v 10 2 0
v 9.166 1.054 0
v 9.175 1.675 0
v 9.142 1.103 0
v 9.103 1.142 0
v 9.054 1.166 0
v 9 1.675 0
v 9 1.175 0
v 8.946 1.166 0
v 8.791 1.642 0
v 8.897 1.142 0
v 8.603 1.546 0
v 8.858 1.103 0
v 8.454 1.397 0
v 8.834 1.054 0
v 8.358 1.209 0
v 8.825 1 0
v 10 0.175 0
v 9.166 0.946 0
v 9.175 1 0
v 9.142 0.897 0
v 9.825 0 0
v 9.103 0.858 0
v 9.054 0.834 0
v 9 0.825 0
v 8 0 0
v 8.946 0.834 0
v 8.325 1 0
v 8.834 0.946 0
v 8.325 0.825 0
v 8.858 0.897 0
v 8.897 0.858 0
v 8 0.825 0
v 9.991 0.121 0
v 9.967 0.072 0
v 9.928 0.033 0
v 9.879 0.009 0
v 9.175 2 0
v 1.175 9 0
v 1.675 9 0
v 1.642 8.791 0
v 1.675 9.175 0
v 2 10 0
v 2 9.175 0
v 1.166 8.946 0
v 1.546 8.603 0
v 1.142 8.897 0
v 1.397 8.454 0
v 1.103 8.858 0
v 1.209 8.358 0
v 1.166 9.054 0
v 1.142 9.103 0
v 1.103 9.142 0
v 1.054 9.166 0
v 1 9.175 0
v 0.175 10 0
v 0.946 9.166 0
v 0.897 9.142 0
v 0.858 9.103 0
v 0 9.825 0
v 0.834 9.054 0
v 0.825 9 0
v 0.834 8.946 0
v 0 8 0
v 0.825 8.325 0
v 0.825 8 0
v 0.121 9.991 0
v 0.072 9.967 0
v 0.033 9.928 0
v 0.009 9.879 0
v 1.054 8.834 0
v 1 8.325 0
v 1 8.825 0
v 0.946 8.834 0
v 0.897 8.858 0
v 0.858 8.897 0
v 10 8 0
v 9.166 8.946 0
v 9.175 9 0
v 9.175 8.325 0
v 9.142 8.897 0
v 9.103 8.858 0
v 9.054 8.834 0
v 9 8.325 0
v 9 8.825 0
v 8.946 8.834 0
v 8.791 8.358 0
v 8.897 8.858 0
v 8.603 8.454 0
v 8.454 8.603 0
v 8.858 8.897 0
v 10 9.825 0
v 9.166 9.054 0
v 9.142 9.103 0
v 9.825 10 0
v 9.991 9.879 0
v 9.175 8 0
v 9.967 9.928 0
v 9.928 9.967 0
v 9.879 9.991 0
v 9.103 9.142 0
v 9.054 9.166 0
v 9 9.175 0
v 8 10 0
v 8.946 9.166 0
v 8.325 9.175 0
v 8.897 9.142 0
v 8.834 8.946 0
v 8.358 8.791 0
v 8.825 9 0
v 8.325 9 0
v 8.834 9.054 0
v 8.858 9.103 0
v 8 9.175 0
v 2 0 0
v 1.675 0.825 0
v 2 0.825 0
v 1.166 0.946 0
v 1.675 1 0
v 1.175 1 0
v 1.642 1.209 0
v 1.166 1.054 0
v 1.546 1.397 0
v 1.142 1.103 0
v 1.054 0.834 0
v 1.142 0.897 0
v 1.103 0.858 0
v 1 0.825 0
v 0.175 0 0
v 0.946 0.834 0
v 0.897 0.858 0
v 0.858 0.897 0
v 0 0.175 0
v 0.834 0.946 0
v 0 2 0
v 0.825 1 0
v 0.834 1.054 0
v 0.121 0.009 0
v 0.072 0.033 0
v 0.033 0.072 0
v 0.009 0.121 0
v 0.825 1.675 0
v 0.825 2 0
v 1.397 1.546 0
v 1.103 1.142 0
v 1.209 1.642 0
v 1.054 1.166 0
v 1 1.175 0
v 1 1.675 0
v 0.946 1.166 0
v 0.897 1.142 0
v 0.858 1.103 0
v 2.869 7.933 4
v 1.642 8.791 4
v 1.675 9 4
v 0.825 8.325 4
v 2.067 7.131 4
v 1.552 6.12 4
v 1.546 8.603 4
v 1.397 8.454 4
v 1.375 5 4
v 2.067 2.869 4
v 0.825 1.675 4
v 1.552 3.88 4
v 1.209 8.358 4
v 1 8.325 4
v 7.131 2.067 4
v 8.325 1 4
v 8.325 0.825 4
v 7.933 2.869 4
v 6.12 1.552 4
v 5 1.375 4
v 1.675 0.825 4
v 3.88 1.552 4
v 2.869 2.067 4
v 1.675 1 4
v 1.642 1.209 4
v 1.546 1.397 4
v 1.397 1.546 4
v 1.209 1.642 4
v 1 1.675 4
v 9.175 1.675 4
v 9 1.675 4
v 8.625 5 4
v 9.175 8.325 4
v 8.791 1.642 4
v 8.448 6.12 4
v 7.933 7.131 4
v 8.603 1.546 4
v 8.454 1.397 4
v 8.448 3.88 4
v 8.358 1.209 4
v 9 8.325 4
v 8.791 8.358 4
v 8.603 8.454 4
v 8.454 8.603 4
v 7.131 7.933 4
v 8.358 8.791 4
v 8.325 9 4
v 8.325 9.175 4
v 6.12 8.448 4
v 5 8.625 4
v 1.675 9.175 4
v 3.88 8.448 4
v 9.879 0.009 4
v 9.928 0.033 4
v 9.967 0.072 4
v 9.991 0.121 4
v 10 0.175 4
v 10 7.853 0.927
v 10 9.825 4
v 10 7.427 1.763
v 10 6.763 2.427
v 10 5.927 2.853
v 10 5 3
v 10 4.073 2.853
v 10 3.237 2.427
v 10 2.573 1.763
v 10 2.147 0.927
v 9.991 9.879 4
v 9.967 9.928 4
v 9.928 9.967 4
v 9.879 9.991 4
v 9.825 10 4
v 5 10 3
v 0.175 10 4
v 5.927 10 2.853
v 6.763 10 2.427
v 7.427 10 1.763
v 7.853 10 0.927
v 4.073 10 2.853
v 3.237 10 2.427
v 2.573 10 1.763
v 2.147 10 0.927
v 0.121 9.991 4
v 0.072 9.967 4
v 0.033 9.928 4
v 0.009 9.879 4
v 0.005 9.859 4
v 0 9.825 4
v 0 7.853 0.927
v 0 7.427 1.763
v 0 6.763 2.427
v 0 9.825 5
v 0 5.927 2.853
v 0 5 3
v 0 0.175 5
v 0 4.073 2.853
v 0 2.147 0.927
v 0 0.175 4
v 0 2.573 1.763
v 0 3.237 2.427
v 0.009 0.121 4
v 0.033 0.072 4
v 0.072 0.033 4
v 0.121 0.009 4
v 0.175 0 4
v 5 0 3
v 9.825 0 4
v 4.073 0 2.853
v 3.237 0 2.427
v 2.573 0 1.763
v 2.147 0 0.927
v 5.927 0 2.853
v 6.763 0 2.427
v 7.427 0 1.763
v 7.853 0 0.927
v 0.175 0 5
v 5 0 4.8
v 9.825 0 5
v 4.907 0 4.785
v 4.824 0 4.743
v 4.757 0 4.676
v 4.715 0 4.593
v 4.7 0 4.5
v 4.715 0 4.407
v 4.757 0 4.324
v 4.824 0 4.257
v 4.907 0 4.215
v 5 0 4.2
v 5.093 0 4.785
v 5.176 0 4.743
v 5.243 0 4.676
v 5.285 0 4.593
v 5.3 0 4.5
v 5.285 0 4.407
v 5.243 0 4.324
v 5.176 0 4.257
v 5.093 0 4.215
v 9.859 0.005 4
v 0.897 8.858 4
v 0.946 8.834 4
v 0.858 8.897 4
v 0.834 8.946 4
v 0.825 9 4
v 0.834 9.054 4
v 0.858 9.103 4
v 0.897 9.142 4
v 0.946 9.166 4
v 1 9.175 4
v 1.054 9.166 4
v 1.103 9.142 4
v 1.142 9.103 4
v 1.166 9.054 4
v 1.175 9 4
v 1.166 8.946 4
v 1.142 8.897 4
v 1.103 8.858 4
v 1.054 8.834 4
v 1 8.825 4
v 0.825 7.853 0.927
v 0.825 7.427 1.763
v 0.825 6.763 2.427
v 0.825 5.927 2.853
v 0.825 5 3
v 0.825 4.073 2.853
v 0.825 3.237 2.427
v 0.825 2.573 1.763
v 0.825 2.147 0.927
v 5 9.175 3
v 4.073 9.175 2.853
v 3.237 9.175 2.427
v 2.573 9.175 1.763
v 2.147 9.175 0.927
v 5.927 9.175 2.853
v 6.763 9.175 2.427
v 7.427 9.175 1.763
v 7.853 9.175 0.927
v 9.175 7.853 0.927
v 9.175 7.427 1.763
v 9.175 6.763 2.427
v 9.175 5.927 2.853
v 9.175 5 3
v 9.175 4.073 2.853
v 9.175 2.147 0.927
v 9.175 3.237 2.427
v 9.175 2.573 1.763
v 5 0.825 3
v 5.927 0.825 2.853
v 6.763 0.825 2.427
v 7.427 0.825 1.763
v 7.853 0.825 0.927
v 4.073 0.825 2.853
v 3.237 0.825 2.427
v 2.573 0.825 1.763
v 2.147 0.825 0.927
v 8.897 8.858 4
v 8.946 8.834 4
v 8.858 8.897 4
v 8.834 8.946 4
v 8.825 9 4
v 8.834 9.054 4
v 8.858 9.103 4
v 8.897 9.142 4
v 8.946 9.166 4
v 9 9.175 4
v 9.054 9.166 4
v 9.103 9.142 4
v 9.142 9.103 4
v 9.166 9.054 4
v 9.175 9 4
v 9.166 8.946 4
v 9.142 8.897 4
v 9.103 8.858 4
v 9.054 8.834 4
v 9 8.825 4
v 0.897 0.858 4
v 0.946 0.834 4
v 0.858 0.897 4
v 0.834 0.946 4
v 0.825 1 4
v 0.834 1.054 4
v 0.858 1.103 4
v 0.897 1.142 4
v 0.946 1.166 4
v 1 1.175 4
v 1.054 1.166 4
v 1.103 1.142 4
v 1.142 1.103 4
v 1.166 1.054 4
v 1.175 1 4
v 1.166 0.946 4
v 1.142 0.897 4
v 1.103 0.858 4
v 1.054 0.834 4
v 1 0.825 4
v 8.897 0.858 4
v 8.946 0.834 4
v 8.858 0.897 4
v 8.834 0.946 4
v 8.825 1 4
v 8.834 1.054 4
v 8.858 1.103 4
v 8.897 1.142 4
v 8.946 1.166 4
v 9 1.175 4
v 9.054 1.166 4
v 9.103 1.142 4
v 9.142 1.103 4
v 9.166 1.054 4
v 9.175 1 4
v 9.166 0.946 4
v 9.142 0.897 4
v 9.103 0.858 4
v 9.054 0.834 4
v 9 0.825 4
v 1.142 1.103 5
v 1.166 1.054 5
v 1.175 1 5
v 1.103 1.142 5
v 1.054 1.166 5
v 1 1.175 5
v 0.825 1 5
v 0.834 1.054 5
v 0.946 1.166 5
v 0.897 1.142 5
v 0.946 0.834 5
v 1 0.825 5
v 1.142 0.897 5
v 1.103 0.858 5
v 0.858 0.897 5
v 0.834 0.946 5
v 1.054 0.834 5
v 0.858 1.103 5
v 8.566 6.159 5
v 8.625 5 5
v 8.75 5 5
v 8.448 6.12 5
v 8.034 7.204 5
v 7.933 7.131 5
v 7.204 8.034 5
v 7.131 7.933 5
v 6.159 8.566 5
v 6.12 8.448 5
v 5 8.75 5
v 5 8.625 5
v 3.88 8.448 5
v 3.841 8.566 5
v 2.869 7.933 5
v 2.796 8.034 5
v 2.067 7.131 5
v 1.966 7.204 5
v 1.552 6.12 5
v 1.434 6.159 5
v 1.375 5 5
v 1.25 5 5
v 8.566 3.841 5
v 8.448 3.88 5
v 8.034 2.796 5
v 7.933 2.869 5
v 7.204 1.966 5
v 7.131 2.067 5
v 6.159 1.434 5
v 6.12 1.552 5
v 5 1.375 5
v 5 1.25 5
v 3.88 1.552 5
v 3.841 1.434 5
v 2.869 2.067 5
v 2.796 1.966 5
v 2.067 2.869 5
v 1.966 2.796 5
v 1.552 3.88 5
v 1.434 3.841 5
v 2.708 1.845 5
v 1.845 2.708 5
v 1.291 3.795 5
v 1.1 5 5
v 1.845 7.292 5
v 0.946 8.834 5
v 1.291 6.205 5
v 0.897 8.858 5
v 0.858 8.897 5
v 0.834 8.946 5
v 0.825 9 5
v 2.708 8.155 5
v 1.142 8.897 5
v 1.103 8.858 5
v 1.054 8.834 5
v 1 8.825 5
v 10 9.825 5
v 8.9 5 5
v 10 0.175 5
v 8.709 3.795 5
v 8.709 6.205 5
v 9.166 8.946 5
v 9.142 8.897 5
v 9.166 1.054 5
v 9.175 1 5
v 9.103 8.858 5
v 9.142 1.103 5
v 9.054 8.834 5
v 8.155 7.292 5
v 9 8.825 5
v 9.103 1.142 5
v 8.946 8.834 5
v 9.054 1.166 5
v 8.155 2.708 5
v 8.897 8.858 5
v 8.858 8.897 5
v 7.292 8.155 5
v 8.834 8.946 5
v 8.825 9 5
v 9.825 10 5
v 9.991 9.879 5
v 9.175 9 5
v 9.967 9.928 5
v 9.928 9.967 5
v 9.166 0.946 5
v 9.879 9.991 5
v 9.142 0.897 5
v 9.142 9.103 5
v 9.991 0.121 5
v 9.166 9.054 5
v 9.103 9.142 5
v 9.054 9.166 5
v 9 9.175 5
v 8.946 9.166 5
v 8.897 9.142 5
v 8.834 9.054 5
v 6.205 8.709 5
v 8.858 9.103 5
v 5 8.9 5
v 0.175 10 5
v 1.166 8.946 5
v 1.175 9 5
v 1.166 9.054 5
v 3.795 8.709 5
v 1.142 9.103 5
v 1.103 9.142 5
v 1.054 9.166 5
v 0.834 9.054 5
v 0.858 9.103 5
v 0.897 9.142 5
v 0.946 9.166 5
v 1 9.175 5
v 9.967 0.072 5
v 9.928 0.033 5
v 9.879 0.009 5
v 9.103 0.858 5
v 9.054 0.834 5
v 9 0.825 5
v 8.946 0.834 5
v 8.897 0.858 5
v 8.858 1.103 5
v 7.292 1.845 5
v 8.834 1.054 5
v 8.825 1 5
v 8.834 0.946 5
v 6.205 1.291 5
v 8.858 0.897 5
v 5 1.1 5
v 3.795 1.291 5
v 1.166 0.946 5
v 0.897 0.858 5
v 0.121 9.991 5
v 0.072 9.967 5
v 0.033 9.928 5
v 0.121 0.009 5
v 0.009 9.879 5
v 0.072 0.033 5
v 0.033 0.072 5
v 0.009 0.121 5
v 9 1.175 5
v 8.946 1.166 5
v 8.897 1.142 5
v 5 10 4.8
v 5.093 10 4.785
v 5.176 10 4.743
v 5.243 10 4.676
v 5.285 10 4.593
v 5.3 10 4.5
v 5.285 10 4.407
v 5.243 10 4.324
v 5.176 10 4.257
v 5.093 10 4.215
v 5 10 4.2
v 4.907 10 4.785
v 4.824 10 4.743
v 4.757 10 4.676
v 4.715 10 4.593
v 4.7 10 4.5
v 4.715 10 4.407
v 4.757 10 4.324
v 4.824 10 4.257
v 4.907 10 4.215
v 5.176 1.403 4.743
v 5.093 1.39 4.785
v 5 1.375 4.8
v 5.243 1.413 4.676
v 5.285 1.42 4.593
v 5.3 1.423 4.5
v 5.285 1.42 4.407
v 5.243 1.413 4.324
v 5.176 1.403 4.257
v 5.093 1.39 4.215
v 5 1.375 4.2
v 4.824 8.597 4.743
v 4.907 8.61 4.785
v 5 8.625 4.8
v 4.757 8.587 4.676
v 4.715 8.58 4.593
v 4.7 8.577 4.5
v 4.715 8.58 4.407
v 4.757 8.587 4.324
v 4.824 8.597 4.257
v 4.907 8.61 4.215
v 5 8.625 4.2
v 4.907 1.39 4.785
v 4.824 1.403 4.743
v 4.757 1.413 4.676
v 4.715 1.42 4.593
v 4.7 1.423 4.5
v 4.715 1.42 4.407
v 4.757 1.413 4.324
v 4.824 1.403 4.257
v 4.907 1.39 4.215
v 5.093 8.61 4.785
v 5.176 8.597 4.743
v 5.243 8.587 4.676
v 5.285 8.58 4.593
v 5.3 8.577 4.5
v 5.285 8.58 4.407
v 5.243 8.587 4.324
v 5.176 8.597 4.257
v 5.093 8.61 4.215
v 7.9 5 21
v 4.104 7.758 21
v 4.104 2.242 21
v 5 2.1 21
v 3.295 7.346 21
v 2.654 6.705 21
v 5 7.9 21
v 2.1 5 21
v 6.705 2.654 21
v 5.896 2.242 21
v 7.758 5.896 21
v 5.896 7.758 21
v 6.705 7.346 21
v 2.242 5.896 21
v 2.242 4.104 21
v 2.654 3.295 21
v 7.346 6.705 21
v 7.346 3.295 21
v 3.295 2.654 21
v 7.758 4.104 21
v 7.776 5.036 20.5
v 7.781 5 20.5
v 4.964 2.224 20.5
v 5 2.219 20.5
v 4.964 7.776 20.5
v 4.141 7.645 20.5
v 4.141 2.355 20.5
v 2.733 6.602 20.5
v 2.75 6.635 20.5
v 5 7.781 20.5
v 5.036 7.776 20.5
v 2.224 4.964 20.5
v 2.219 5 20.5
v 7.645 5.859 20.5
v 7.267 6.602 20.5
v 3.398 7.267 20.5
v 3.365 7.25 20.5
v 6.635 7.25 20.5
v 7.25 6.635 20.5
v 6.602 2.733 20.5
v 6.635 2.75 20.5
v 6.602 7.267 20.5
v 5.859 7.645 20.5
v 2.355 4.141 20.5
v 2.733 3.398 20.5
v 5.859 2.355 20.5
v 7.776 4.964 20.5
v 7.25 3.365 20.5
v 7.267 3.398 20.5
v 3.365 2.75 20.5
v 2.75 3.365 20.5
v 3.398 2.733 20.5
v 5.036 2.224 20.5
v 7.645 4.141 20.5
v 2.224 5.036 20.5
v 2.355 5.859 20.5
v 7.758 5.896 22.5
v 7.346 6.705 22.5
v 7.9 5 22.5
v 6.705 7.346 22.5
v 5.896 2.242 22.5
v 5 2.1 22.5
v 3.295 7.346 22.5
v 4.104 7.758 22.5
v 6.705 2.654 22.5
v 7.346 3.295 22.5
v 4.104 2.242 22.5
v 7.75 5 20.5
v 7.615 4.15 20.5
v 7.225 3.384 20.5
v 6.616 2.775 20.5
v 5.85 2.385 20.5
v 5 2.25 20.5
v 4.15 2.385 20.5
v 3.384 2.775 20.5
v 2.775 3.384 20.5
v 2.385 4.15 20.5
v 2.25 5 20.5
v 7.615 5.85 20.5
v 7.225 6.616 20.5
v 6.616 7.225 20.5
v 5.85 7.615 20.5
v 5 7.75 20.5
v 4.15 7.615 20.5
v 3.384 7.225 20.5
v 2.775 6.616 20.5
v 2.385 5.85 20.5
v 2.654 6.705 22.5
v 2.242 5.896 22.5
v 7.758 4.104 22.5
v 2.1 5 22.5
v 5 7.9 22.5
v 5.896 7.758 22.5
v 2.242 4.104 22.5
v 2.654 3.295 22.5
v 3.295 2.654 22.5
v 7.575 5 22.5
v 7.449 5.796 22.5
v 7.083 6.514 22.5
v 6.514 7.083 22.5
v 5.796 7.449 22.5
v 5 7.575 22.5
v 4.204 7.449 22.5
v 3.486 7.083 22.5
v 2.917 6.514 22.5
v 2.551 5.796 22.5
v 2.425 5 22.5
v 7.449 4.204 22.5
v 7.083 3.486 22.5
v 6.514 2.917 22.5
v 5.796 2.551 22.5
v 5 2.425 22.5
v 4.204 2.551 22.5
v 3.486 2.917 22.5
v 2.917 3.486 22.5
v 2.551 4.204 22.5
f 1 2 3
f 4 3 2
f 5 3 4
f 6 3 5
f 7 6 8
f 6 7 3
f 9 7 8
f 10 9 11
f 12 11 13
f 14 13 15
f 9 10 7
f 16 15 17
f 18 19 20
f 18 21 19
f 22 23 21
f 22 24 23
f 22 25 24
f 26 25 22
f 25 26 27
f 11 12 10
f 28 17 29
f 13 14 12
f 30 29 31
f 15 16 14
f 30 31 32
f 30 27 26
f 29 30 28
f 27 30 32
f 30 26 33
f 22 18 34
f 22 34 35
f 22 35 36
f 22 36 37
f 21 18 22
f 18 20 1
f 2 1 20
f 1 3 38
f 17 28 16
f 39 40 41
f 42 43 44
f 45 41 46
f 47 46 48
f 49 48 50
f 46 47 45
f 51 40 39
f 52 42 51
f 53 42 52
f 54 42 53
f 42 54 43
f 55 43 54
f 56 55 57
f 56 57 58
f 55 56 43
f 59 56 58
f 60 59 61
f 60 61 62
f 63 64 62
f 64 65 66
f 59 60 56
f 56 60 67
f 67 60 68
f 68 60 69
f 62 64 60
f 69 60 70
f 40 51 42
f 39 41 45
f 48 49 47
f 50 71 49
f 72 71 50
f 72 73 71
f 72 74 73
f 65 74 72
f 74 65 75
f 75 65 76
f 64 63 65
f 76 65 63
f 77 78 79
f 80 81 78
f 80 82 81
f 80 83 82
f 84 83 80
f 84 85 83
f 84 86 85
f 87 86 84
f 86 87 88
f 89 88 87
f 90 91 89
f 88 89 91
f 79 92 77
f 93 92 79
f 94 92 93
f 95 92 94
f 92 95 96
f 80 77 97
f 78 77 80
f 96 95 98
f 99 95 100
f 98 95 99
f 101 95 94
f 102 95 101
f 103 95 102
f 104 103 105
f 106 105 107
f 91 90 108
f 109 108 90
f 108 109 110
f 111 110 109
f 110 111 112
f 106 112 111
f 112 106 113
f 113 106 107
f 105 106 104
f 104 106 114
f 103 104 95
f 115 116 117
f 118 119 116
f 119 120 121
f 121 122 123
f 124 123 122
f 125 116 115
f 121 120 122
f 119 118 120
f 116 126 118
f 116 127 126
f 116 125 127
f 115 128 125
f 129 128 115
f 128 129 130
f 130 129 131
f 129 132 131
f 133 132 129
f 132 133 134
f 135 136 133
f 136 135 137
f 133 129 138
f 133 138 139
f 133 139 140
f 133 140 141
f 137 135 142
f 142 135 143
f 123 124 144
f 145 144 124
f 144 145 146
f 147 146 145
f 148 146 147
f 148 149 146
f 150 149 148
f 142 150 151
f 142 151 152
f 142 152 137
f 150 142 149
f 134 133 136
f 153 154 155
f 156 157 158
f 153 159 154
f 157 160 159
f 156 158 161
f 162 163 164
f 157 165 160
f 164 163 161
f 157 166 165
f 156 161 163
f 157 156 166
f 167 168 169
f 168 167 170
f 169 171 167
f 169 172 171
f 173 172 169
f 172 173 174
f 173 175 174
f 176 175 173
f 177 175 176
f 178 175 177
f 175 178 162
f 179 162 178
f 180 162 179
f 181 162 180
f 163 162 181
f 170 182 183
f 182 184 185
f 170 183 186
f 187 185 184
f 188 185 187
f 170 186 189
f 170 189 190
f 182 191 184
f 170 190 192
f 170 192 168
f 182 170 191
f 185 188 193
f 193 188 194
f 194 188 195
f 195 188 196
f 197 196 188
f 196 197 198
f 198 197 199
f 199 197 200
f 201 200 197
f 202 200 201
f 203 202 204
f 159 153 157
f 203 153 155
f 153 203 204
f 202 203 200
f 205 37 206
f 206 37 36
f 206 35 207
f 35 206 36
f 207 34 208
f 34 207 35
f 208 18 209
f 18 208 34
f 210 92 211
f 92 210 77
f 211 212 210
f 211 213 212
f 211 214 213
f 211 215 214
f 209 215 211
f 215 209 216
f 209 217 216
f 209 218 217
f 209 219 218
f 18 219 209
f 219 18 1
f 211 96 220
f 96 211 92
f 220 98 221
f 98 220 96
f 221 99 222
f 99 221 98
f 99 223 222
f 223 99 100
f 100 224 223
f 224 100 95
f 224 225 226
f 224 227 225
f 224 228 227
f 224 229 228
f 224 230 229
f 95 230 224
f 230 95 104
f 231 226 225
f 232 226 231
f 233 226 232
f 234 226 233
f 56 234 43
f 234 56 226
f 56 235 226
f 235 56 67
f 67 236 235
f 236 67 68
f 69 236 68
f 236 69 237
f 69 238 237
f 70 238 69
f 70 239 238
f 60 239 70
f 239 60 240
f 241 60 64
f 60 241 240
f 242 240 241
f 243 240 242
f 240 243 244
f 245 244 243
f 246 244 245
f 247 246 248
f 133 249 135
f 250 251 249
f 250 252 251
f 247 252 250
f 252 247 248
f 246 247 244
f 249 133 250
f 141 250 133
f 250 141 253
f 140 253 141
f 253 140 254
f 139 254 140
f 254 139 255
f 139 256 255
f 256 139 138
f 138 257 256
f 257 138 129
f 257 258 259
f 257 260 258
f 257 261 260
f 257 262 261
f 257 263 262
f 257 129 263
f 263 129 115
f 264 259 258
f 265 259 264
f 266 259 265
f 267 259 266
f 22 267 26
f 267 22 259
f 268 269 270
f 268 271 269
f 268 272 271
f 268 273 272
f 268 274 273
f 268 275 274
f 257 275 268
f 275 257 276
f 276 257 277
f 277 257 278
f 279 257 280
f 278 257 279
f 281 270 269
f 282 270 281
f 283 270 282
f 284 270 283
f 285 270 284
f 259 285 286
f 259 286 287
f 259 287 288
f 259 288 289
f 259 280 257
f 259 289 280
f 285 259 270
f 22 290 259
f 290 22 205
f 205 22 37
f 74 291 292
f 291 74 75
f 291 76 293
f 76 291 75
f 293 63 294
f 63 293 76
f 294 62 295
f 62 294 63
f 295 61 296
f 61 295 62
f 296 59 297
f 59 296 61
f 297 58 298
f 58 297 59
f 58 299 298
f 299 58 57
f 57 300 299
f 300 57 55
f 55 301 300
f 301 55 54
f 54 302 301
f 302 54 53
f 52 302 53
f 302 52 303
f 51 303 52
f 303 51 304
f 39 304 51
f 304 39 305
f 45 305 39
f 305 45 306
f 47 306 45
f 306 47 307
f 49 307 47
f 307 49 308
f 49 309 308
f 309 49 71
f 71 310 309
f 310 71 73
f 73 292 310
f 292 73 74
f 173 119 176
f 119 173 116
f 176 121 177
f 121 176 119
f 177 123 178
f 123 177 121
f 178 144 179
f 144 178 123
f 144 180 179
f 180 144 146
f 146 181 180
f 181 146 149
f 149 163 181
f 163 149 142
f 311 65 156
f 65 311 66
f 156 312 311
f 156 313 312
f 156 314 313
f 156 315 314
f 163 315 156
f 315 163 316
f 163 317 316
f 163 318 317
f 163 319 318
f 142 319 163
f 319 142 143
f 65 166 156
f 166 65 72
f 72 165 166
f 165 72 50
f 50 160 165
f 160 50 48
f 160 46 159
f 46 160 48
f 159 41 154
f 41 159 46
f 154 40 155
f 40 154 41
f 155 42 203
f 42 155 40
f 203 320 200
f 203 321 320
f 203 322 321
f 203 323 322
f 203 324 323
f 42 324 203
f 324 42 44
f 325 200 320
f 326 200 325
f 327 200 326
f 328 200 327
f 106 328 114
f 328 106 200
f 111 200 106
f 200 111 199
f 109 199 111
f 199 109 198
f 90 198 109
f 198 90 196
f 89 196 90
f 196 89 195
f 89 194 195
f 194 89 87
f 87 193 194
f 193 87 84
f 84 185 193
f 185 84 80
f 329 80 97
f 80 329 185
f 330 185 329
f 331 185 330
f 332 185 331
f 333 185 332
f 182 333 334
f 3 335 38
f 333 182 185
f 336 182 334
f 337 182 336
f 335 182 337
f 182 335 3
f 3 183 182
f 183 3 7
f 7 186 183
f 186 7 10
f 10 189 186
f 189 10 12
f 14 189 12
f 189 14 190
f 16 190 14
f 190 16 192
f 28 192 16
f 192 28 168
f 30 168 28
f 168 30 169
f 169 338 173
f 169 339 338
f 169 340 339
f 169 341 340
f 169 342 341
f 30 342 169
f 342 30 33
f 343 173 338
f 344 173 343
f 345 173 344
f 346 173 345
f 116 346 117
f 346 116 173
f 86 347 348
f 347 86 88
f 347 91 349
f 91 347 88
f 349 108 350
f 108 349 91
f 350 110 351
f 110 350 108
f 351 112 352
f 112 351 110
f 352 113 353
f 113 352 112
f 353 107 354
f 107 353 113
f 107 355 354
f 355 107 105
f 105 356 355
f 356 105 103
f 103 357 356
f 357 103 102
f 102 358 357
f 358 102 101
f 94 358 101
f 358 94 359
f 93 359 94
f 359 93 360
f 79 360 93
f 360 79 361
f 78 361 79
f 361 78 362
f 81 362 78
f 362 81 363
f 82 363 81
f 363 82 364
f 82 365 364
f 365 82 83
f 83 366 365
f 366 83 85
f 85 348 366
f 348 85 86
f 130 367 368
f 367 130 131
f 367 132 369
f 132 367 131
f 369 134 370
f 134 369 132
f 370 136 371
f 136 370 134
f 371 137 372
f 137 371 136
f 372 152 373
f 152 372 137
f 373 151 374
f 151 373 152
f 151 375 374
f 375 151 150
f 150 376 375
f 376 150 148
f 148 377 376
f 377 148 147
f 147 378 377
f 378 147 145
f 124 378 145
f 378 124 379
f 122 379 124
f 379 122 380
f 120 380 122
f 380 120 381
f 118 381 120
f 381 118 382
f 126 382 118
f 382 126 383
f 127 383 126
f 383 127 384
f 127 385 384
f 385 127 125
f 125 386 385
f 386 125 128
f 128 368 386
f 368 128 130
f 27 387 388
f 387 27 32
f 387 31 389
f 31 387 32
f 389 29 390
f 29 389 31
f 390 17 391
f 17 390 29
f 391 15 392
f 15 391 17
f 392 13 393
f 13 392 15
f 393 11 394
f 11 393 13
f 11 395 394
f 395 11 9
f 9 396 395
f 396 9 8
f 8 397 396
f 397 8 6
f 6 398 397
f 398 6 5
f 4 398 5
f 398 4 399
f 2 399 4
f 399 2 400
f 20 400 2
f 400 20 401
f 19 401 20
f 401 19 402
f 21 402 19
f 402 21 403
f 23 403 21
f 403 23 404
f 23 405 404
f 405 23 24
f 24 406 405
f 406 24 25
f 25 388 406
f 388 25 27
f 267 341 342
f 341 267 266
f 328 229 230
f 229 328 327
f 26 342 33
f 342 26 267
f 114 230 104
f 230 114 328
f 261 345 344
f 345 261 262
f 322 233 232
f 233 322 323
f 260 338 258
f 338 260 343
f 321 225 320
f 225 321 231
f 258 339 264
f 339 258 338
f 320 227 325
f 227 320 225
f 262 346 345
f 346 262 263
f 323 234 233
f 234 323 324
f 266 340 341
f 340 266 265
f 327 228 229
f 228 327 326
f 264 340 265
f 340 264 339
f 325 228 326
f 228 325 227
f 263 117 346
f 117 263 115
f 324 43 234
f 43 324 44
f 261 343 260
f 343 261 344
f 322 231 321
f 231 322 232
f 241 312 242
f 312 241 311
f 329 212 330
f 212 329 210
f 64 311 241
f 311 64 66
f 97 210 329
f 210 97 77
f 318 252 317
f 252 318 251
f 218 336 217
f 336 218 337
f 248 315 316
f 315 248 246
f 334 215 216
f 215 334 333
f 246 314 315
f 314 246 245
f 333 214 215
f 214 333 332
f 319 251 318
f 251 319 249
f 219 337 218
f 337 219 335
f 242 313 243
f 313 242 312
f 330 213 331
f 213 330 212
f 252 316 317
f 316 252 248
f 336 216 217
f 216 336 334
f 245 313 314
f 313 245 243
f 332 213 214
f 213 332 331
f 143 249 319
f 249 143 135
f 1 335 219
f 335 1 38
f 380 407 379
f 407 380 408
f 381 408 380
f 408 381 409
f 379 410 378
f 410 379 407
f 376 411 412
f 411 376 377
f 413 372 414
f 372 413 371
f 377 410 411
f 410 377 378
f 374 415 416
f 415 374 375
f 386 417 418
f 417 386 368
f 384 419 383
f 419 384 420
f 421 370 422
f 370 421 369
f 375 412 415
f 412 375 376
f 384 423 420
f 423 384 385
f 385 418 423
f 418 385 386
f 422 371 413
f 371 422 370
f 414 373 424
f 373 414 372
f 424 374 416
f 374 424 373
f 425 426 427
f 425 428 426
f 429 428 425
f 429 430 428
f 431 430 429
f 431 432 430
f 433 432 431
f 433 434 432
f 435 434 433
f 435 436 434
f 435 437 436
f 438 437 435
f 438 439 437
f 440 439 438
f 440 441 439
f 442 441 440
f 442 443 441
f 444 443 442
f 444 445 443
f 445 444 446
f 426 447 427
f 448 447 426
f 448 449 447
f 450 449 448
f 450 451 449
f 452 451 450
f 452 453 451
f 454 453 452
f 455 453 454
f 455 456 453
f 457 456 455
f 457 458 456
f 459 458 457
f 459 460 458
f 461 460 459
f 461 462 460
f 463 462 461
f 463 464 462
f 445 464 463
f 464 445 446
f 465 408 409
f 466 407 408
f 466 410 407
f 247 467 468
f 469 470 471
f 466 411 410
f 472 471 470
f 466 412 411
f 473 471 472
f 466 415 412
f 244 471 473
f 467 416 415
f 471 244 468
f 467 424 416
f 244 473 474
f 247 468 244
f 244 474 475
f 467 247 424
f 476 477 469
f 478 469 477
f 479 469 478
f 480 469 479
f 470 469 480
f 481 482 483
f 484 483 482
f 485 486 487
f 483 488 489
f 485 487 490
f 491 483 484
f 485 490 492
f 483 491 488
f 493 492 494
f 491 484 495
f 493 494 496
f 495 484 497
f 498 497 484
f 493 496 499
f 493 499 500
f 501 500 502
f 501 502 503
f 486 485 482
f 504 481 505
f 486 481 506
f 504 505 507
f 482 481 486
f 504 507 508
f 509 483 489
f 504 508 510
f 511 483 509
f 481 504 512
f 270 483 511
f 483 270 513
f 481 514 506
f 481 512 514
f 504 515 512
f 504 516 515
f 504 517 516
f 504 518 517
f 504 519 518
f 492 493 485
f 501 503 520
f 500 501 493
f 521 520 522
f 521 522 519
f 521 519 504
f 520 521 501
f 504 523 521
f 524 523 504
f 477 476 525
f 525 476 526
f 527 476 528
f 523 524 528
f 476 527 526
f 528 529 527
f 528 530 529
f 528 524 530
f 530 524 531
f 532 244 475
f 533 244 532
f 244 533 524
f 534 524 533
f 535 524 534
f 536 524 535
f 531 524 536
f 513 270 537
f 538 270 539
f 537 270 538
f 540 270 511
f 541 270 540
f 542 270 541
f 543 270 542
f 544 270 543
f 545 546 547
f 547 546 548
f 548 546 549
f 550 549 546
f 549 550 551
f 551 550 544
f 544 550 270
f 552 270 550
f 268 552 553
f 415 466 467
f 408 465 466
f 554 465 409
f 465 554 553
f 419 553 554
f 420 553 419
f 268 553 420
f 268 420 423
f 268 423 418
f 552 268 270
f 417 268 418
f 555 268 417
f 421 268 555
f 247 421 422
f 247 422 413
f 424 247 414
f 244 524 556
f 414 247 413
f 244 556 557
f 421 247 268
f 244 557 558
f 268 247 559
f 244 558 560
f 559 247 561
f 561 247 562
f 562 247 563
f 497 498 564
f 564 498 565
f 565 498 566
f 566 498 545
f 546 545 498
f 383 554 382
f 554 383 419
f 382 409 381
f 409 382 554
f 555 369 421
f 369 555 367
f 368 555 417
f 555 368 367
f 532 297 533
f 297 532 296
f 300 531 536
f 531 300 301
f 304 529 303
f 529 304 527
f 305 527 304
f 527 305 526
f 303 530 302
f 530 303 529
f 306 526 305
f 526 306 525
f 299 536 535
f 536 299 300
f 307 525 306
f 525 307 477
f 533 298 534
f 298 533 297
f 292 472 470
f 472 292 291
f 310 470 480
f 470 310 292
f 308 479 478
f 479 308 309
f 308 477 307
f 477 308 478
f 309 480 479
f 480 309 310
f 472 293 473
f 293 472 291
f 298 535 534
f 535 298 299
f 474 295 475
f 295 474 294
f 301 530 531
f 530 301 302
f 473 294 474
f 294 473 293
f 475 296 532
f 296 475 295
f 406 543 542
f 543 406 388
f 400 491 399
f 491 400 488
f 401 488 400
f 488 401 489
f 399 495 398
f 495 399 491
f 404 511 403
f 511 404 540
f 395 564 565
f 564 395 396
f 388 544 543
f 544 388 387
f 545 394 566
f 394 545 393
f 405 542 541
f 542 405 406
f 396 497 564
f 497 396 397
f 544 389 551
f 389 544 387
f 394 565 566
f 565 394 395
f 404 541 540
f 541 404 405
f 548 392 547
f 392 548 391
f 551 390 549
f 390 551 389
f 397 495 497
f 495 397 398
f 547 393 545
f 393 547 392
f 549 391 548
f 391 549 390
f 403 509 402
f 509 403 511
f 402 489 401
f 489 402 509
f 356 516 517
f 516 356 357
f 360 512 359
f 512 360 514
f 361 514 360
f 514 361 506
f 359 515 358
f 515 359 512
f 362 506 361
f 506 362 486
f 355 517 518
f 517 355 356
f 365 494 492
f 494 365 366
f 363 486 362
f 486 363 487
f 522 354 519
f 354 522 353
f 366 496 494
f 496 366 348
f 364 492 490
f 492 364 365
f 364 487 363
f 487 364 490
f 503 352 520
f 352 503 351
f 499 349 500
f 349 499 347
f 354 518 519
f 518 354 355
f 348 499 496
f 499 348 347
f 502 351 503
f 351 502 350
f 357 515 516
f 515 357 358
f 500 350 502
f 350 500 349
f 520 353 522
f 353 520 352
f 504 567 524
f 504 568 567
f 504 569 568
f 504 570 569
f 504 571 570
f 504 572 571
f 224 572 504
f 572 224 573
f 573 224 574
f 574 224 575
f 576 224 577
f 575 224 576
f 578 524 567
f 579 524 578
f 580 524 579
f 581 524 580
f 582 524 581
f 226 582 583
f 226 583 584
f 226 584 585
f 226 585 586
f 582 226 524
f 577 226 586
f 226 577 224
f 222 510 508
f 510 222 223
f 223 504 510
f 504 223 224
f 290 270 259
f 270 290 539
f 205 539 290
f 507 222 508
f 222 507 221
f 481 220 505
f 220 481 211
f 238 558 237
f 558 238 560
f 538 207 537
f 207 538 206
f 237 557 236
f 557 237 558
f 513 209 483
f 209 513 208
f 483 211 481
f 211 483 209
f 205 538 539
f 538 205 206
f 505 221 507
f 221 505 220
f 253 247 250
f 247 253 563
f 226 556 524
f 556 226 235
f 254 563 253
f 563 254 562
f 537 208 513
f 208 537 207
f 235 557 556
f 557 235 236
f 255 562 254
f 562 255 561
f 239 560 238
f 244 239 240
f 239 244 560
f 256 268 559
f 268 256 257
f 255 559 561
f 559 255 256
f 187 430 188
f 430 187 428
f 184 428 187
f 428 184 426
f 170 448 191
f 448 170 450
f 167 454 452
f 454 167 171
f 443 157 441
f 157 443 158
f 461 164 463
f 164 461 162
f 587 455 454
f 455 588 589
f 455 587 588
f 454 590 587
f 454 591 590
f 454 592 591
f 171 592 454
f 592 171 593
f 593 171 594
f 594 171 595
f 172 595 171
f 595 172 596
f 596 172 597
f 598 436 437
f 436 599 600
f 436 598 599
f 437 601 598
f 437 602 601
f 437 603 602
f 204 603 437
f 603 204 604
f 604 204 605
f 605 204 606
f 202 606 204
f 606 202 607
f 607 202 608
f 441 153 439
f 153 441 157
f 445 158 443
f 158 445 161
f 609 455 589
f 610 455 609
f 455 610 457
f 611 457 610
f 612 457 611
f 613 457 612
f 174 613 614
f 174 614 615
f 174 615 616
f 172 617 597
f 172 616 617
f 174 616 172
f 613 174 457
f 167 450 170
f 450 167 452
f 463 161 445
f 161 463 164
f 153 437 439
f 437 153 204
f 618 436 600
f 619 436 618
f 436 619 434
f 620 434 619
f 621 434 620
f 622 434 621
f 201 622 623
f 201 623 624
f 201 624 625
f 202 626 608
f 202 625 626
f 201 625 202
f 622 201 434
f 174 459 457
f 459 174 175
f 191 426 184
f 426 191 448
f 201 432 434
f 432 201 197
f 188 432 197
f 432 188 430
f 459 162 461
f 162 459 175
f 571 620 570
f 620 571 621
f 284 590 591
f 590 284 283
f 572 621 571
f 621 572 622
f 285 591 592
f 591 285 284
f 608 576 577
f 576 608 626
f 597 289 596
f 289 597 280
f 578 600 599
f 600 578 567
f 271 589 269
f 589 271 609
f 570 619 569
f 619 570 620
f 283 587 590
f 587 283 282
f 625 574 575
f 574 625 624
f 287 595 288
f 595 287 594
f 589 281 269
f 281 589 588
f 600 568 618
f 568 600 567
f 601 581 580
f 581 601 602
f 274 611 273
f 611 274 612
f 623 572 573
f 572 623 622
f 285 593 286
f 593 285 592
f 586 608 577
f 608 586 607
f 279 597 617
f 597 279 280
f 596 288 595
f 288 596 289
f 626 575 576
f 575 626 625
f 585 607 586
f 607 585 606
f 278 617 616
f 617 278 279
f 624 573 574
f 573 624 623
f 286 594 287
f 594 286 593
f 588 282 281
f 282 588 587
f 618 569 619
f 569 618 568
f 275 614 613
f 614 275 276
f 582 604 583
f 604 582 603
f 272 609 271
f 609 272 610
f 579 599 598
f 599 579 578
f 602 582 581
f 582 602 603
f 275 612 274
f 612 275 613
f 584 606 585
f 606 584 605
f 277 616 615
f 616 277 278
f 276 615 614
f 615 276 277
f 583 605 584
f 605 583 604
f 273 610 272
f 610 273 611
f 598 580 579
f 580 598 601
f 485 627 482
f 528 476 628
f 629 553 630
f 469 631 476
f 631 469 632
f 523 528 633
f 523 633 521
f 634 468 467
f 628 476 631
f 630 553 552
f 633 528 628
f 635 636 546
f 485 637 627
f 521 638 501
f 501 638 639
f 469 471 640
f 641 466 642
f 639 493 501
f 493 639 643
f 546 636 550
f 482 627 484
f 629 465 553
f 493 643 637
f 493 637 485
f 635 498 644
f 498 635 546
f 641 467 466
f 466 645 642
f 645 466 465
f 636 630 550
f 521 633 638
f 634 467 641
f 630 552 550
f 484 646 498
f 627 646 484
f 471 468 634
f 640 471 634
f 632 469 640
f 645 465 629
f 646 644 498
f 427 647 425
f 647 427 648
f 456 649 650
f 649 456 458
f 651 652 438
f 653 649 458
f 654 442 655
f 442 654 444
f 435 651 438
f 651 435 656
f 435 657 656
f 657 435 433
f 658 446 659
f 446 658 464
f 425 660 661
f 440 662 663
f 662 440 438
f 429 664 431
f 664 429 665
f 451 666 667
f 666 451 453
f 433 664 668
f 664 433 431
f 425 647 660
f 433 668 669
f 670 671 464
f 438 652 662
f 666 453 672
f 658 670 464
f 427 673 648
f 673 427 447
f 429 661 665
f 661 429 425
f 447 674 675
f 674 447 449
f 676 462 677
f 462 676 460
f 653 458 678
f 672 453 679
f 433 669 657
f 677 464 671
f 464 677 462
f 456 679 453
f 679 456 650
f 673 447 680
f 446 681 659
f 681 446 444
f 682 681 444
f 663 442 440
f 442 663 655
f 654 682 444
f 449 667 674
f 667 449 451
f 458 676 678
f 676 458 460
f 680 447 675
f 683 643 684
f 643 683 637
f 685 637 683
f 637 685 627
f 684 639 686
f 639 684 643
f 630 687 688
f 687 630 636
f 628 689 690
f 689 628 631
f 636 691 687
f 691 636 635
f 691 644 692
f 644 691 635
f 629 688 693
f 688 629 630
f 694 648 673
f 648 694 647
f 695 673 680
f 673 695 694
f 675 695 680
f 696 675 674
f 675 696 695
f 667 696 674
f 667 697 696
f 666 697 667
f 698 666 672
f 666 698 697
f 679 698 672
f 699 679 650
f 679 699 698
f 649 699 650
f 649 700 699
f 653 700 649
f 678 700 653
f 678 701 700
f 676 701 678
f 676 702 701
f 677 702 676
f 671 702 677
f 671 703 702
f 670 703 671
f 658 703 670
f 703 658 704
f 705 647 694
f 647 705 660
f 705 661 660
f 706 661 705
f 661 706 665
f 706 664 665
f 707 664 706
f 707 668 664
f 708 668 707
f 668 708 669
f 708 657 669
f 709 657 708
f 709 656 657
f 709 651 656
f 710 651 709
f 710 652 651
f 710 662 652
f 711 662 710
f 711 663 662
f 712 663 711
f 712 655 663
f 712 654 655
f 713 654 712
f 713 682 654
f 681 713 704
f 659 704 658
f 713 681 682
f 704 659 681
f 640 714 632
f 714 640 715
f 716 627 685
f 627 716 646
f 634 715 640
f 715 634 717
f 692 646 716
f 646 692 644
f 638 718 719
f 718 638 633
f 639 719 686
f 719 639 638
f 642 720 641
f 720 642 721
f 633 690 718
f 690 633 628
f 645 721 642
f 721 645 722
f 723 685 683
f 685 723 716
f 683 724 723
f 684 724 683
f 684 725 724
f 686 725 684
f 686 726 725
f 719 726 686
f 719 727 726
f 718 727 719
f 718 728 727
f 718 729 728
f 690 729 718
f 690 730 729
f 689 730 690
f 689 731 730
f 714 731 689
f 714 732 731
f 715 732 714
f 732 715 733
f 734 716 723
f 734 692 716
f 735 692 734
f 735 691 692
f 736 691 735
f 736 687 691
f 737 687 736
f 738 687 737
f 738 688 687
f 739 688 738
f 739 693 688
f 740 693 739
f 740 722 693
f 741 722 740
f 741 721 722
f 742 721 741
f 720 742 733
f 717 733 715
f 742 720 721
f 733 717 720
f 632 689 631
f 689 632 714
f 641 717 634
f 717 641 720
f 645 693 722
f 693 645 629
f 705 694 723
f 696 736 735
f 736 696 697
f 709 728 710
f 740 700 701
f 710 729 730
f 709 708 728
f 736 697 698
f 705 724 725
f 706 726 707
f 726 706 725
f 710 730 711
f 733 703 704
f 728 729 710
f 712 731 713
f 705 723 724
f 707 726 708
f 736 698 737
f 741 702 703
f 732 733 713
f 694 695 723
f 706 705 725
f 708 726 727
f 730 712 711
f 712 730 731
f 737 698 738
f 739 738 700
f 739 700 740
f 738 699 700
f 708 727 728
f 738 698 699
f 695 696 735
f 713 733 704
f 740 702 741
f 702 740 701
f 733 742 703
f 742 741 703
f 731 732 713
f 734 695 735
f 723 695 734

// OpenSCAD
 /*
Title: Hair Dryer Fan Holder Base
Copyright: Jet Flener 2024
Author: Jet Flener - jetflener@ou.edu
License: GNU GPL v3
Encoding: UTF-8
Version: 0.1.0-alpha
Description: An adapter to hold a hair dryer fan, for use with a duct.

This code has units in cm. Rescale for printing. The original design for the mount is taken from OPENSCAD Library file by the DoomMeister Mounting surround for small DC fans (25 - 120mm).  Clamps require an M3 bolt.
*/

//render everything
render(){
    difference(){
        fan_mount(size=10,thick=4);
        
         translate([5, 10, 0])rotate([90, 0, 0])fanBaseCutOut();
            translate([0, 5, 0])rotate([90, 0, 90])fanBaseCutOut();
        
    }
    
    //use the translates to adjust viewing positions
    translate([0, 0, 4])fanDuctBasePlate();
    translate([0, 0, 5])fanDuct();
    translate([0, 0, 7])fanDuctRotate();
    
    //translate([8,5,25])rotate([0, -90, 90])curved_cylinder(5.8, 5.5);
    
}

module fanBaseCutOut(){
    cylinder(h=10, r = 3);
    $fn=20;
}
module fanDuctBasePlate(){
    
    difference(){
        roundedcube([10, 10, 1], radius = 0.35/2, apply_to = "z");
        translate([5, 5, 0])cylinder(h=1, d=7.25);
        translate([1, 1, 0.5])fanDuctBasePlateMountingHoles(); 
        fanDuctBasePlateClampHole();
    }
    
    
    $fn = 20; 
}

module fanDuctBasePlateMountingHoles(){
    translate([0, 0, 0])cylinder(h=1, d=0.35, center=true);
    translate([0, 8, 0])cylinder(h=1, d=0.35, center=true);
    translate([8, 0, 0])cylinder(h=1, d=0.35, center=true);
    translate([8, 8, 0])cylinder(h=1, d=0.35, center=true);
}
module fanDuctBasePlateClampHole(){
    //M6 screw
    translate([5, 5, 0.5])rotate([90,0,0])cylinder(h=10,d=0.6,center=true);

   
}
module fanDuct(){
    translate([5, 5, 0])difference(){
        cylinder(h=16, d1=7.8, d2=5.8);
        cylinder(h=16, d1=7.5, d2=5.5);
        
    }
   
    $fn = 20;
}

module fanDuctRotate(){
     //fitting for duct, interior diameter of 5.15 cm (slightly larger than 2 in)
    translate([5,5,14.5])difference(){
        cylinder(h=2, d=5.8, center=true);
        cylinder(h=2, d1=5.5, d2=5.15, center=true);
    }
    $fn = 20;
}
module curved_cylinder(outer_diameter, inner_diameter, angle=90) {

    height = 10;

    outer_radius = outer_diameter / 2;
    inner_radius = inner_diameter / 2;


    difference() {
        // Outer curved shape (this will be the outer part of the ring)
        rotate_extrude(angle=angle) {
            translate([outer_radius, 0, 0]) 
                circle(outer_radius);
        }
        
        // Inner curved shape (cutout for the hollow cylinder)
        rotate_extrude(angle=angle) {
            translate([inner_radius, 0, 0]) 
                circle(inner_radius);
        }
    }
    
    
    $fn = 20;
}

































//rounded cube for jet
// Higher definition curves
//$fs = 0.01;

module roundedcube(size = [1, 1, 1], center = false, radius = 0.5, apply_to = "all") {
    $fs = 0.1;
	// If single value, convert to [x, y, z] vector
	size = (size[0] == undef) ? [size, size, size] : size;

	translate_min = radius;
	translate_xmax = size[0] - radius;
	translate_ymax = size[1] - radius;
	translate_zmax = size[2] - radius;

	diameter = radius * 2;

	module build_point(type = "sphere", rotate = [0, 0, 0]) {
		if (type == "sphere") {
			sphere(r = radius);
		} else if (type == "cylinder") {
			rotate(a = rotate)
			cylinder(h = diameter, r = radius, center = true);
		}
	}

	obj_translate = (center == false) ?
		[0, 0, 0] : [
			-(size[0] / 2),
			-(size[1] / 2),
			-(size[2] / 2)
		];

	translate(v = obj_translate) {
		hull() {
			for (translate_x = [translate_min, translate_xmax]) {
				x_at = (translate_x == translate_min) ? "min" : "max";
				for (translate_y = [translate_min, translate_ymax]) {
					y_at = (translate_y == translate_min) ? "min" : "max";
					for (translate_z = [translate_min, translate_zmax]) {
						z_at = (translate_z == translate_min) ? "min" : "max";

						translate(v = [translate_x, translate_y, translate_z])
						if (
							(apply_to == "all") ||
							(apply_to == "xmin" && x_at == "min") || (apply_to == "xmax" && x_at == "max") ||
							(apply_to == "ymin" && y_at == "min") || (apply_to == "ymax" && y_at == "max") ||
							(apply_to == "zmin" && z_at == "min") || (apply_to == "zmax" && z_at == "max")
						) {
							build_point("sphere");
						} else {
							rotate = 
								(apply_to == "xmin" || apply_to == "xmax" || apply_to == "x") ? [0, 90, 0] : (
								(apply_to == "ymin" || apply_to == "ymax" || apply_to == "y") ? [90, 90, 0] :
								[0, 0, 0]
							);
							build_point("cylinder", rotate);
						}
					}
				}
			}
		}
	}
}


//fan stuff
module fan_mount(size=40,thick = 4)
{
if(size == 18)
    {
	_fan_mount(
			fan_size = 18,
			fan_mounting_pitch = 15.22,
			fan_m_hole_dia = .35,
			holder_thickness = thick
		 );
	}
if(size == 10)
	{
	_fan_mount(
			fan_size = 10,
			fan_mounting_pitch = 8,
			fan_m_hole_dia = .35,
			holder_thickness = thick
		 );
	}
if(size == 30)
	{
	_fan_mount(
			fan_size = 30,
			fan_mounting_pitch = 24,
			fan_m_hole_dia = 3,
			holder_thickness = thick
		 );
	}

if(size == 40)
	{
	_fan_mount(
			fan_size = 40,
			fan_mounting_pitch = 32,
			fan_m_hole_dia = 3.5,
			holder_thickness = thick
		 );
	}
if(size == 45)
	{
	_fan_mount(
			fan_size = 45,
			fan_mounting_pitch = 37,
			fan_m_hole_dia = 4.3,
			holder_thickness = thick
		 );
	}
if(size == 60)
	{
	_fan_mount(
			fan_size = 60,
			fan_mounting_pitch = 50,
			fan_m_hole_dia = 4.4,
			holder_thickness = thick
		 );
	}
if(size == 80)
	{
	_fan_mount(
			fan_size = 80,
			fan_mounting_pitch = 71.5,
			fan_m_hole_dia = 4.4,
			holder_thickness = thick
		 );
	}

if(size == 120)
	{
	_fan_mount(
			fan_size = 120,
			fan_mounting_pitch = 105,
			fan_m_hole_dia = 4.4,
			holder_thickness = thick
		 );
	}
}


//inner module
module _fan_mount(
			fan_size, //nominsl size of fan
			fan_mounting_pitch, //pitch between mounting holes
			fan_m_hole_dia, //mounting hole diameter
			holder_thickness //user defined thickness
		 )
{

offset1 = (fan_size-(fan_mounting_pitch + fan_m_hole_dia))/2;
offset2 = (fan_size-(fan_mounting_pitch))/2;
offset3 = offset2 + fan_mounting_pitch;
thickness = (fan_size-fan_mounting_pitch)/2;	
			
			//difference()
			//{
			linear_extrude(height = holder_thickness)
			union()
			{	
			difference()
			{
				translate([fan_m_hole_dia/2,fan_m_hole_dia/2,0])
				minkowski()
				{	
					square([fan_size - fan_m_hole_dia,fan_size - fan_m_hole_dia]);
					circle(r= fan_m_hole_dia/2, $fn=20);
				}
			
					translate([offset1,offset1,0])
					square([fan_mounting_pitch + fan_m_hole_dia,fan_mounting_pitch + fan_m_hole_dia]);
				}
				translate([offset2,offset2,0])
				rotate([0,0,0])_corner_hole();
				translate([offset3,offset2,0])
				rotate([0,0,90])_corner_hole();
				translate([offset2,offset3,0])
				rotate([0,0,90])_corner_hole();
				translate([offset3,offset3,0])
				rotate([0,0,0])_corner_hole();
			}

module _corner_hole()
{
				difference(){
					union(){
							difference(){
							square([fan_m_hole_dia + thickness,fan_m_hole_dia + thickness],center=true);
							square([(fan_m_hole_dia + thickness)/2,(fan_m_hole_dia + thickness)/2],center=false);
							translate([-(fan_m_hole_dia + thickness)/2,-(fan_m_hole_dia + thickness)/2])
							square([(fan_m_hole_dia + thickness)/2,(fan_m_hole_dia + thickness)/2],center=false);
							}
					circle(r=(fan_m_hole_dia + thickness)/2, $fn=20);
					}
					circle(r=(fan_m_hole_dia)/2, $fn=20);
				}
}


echo(offset1,offset2,thickness);
}
